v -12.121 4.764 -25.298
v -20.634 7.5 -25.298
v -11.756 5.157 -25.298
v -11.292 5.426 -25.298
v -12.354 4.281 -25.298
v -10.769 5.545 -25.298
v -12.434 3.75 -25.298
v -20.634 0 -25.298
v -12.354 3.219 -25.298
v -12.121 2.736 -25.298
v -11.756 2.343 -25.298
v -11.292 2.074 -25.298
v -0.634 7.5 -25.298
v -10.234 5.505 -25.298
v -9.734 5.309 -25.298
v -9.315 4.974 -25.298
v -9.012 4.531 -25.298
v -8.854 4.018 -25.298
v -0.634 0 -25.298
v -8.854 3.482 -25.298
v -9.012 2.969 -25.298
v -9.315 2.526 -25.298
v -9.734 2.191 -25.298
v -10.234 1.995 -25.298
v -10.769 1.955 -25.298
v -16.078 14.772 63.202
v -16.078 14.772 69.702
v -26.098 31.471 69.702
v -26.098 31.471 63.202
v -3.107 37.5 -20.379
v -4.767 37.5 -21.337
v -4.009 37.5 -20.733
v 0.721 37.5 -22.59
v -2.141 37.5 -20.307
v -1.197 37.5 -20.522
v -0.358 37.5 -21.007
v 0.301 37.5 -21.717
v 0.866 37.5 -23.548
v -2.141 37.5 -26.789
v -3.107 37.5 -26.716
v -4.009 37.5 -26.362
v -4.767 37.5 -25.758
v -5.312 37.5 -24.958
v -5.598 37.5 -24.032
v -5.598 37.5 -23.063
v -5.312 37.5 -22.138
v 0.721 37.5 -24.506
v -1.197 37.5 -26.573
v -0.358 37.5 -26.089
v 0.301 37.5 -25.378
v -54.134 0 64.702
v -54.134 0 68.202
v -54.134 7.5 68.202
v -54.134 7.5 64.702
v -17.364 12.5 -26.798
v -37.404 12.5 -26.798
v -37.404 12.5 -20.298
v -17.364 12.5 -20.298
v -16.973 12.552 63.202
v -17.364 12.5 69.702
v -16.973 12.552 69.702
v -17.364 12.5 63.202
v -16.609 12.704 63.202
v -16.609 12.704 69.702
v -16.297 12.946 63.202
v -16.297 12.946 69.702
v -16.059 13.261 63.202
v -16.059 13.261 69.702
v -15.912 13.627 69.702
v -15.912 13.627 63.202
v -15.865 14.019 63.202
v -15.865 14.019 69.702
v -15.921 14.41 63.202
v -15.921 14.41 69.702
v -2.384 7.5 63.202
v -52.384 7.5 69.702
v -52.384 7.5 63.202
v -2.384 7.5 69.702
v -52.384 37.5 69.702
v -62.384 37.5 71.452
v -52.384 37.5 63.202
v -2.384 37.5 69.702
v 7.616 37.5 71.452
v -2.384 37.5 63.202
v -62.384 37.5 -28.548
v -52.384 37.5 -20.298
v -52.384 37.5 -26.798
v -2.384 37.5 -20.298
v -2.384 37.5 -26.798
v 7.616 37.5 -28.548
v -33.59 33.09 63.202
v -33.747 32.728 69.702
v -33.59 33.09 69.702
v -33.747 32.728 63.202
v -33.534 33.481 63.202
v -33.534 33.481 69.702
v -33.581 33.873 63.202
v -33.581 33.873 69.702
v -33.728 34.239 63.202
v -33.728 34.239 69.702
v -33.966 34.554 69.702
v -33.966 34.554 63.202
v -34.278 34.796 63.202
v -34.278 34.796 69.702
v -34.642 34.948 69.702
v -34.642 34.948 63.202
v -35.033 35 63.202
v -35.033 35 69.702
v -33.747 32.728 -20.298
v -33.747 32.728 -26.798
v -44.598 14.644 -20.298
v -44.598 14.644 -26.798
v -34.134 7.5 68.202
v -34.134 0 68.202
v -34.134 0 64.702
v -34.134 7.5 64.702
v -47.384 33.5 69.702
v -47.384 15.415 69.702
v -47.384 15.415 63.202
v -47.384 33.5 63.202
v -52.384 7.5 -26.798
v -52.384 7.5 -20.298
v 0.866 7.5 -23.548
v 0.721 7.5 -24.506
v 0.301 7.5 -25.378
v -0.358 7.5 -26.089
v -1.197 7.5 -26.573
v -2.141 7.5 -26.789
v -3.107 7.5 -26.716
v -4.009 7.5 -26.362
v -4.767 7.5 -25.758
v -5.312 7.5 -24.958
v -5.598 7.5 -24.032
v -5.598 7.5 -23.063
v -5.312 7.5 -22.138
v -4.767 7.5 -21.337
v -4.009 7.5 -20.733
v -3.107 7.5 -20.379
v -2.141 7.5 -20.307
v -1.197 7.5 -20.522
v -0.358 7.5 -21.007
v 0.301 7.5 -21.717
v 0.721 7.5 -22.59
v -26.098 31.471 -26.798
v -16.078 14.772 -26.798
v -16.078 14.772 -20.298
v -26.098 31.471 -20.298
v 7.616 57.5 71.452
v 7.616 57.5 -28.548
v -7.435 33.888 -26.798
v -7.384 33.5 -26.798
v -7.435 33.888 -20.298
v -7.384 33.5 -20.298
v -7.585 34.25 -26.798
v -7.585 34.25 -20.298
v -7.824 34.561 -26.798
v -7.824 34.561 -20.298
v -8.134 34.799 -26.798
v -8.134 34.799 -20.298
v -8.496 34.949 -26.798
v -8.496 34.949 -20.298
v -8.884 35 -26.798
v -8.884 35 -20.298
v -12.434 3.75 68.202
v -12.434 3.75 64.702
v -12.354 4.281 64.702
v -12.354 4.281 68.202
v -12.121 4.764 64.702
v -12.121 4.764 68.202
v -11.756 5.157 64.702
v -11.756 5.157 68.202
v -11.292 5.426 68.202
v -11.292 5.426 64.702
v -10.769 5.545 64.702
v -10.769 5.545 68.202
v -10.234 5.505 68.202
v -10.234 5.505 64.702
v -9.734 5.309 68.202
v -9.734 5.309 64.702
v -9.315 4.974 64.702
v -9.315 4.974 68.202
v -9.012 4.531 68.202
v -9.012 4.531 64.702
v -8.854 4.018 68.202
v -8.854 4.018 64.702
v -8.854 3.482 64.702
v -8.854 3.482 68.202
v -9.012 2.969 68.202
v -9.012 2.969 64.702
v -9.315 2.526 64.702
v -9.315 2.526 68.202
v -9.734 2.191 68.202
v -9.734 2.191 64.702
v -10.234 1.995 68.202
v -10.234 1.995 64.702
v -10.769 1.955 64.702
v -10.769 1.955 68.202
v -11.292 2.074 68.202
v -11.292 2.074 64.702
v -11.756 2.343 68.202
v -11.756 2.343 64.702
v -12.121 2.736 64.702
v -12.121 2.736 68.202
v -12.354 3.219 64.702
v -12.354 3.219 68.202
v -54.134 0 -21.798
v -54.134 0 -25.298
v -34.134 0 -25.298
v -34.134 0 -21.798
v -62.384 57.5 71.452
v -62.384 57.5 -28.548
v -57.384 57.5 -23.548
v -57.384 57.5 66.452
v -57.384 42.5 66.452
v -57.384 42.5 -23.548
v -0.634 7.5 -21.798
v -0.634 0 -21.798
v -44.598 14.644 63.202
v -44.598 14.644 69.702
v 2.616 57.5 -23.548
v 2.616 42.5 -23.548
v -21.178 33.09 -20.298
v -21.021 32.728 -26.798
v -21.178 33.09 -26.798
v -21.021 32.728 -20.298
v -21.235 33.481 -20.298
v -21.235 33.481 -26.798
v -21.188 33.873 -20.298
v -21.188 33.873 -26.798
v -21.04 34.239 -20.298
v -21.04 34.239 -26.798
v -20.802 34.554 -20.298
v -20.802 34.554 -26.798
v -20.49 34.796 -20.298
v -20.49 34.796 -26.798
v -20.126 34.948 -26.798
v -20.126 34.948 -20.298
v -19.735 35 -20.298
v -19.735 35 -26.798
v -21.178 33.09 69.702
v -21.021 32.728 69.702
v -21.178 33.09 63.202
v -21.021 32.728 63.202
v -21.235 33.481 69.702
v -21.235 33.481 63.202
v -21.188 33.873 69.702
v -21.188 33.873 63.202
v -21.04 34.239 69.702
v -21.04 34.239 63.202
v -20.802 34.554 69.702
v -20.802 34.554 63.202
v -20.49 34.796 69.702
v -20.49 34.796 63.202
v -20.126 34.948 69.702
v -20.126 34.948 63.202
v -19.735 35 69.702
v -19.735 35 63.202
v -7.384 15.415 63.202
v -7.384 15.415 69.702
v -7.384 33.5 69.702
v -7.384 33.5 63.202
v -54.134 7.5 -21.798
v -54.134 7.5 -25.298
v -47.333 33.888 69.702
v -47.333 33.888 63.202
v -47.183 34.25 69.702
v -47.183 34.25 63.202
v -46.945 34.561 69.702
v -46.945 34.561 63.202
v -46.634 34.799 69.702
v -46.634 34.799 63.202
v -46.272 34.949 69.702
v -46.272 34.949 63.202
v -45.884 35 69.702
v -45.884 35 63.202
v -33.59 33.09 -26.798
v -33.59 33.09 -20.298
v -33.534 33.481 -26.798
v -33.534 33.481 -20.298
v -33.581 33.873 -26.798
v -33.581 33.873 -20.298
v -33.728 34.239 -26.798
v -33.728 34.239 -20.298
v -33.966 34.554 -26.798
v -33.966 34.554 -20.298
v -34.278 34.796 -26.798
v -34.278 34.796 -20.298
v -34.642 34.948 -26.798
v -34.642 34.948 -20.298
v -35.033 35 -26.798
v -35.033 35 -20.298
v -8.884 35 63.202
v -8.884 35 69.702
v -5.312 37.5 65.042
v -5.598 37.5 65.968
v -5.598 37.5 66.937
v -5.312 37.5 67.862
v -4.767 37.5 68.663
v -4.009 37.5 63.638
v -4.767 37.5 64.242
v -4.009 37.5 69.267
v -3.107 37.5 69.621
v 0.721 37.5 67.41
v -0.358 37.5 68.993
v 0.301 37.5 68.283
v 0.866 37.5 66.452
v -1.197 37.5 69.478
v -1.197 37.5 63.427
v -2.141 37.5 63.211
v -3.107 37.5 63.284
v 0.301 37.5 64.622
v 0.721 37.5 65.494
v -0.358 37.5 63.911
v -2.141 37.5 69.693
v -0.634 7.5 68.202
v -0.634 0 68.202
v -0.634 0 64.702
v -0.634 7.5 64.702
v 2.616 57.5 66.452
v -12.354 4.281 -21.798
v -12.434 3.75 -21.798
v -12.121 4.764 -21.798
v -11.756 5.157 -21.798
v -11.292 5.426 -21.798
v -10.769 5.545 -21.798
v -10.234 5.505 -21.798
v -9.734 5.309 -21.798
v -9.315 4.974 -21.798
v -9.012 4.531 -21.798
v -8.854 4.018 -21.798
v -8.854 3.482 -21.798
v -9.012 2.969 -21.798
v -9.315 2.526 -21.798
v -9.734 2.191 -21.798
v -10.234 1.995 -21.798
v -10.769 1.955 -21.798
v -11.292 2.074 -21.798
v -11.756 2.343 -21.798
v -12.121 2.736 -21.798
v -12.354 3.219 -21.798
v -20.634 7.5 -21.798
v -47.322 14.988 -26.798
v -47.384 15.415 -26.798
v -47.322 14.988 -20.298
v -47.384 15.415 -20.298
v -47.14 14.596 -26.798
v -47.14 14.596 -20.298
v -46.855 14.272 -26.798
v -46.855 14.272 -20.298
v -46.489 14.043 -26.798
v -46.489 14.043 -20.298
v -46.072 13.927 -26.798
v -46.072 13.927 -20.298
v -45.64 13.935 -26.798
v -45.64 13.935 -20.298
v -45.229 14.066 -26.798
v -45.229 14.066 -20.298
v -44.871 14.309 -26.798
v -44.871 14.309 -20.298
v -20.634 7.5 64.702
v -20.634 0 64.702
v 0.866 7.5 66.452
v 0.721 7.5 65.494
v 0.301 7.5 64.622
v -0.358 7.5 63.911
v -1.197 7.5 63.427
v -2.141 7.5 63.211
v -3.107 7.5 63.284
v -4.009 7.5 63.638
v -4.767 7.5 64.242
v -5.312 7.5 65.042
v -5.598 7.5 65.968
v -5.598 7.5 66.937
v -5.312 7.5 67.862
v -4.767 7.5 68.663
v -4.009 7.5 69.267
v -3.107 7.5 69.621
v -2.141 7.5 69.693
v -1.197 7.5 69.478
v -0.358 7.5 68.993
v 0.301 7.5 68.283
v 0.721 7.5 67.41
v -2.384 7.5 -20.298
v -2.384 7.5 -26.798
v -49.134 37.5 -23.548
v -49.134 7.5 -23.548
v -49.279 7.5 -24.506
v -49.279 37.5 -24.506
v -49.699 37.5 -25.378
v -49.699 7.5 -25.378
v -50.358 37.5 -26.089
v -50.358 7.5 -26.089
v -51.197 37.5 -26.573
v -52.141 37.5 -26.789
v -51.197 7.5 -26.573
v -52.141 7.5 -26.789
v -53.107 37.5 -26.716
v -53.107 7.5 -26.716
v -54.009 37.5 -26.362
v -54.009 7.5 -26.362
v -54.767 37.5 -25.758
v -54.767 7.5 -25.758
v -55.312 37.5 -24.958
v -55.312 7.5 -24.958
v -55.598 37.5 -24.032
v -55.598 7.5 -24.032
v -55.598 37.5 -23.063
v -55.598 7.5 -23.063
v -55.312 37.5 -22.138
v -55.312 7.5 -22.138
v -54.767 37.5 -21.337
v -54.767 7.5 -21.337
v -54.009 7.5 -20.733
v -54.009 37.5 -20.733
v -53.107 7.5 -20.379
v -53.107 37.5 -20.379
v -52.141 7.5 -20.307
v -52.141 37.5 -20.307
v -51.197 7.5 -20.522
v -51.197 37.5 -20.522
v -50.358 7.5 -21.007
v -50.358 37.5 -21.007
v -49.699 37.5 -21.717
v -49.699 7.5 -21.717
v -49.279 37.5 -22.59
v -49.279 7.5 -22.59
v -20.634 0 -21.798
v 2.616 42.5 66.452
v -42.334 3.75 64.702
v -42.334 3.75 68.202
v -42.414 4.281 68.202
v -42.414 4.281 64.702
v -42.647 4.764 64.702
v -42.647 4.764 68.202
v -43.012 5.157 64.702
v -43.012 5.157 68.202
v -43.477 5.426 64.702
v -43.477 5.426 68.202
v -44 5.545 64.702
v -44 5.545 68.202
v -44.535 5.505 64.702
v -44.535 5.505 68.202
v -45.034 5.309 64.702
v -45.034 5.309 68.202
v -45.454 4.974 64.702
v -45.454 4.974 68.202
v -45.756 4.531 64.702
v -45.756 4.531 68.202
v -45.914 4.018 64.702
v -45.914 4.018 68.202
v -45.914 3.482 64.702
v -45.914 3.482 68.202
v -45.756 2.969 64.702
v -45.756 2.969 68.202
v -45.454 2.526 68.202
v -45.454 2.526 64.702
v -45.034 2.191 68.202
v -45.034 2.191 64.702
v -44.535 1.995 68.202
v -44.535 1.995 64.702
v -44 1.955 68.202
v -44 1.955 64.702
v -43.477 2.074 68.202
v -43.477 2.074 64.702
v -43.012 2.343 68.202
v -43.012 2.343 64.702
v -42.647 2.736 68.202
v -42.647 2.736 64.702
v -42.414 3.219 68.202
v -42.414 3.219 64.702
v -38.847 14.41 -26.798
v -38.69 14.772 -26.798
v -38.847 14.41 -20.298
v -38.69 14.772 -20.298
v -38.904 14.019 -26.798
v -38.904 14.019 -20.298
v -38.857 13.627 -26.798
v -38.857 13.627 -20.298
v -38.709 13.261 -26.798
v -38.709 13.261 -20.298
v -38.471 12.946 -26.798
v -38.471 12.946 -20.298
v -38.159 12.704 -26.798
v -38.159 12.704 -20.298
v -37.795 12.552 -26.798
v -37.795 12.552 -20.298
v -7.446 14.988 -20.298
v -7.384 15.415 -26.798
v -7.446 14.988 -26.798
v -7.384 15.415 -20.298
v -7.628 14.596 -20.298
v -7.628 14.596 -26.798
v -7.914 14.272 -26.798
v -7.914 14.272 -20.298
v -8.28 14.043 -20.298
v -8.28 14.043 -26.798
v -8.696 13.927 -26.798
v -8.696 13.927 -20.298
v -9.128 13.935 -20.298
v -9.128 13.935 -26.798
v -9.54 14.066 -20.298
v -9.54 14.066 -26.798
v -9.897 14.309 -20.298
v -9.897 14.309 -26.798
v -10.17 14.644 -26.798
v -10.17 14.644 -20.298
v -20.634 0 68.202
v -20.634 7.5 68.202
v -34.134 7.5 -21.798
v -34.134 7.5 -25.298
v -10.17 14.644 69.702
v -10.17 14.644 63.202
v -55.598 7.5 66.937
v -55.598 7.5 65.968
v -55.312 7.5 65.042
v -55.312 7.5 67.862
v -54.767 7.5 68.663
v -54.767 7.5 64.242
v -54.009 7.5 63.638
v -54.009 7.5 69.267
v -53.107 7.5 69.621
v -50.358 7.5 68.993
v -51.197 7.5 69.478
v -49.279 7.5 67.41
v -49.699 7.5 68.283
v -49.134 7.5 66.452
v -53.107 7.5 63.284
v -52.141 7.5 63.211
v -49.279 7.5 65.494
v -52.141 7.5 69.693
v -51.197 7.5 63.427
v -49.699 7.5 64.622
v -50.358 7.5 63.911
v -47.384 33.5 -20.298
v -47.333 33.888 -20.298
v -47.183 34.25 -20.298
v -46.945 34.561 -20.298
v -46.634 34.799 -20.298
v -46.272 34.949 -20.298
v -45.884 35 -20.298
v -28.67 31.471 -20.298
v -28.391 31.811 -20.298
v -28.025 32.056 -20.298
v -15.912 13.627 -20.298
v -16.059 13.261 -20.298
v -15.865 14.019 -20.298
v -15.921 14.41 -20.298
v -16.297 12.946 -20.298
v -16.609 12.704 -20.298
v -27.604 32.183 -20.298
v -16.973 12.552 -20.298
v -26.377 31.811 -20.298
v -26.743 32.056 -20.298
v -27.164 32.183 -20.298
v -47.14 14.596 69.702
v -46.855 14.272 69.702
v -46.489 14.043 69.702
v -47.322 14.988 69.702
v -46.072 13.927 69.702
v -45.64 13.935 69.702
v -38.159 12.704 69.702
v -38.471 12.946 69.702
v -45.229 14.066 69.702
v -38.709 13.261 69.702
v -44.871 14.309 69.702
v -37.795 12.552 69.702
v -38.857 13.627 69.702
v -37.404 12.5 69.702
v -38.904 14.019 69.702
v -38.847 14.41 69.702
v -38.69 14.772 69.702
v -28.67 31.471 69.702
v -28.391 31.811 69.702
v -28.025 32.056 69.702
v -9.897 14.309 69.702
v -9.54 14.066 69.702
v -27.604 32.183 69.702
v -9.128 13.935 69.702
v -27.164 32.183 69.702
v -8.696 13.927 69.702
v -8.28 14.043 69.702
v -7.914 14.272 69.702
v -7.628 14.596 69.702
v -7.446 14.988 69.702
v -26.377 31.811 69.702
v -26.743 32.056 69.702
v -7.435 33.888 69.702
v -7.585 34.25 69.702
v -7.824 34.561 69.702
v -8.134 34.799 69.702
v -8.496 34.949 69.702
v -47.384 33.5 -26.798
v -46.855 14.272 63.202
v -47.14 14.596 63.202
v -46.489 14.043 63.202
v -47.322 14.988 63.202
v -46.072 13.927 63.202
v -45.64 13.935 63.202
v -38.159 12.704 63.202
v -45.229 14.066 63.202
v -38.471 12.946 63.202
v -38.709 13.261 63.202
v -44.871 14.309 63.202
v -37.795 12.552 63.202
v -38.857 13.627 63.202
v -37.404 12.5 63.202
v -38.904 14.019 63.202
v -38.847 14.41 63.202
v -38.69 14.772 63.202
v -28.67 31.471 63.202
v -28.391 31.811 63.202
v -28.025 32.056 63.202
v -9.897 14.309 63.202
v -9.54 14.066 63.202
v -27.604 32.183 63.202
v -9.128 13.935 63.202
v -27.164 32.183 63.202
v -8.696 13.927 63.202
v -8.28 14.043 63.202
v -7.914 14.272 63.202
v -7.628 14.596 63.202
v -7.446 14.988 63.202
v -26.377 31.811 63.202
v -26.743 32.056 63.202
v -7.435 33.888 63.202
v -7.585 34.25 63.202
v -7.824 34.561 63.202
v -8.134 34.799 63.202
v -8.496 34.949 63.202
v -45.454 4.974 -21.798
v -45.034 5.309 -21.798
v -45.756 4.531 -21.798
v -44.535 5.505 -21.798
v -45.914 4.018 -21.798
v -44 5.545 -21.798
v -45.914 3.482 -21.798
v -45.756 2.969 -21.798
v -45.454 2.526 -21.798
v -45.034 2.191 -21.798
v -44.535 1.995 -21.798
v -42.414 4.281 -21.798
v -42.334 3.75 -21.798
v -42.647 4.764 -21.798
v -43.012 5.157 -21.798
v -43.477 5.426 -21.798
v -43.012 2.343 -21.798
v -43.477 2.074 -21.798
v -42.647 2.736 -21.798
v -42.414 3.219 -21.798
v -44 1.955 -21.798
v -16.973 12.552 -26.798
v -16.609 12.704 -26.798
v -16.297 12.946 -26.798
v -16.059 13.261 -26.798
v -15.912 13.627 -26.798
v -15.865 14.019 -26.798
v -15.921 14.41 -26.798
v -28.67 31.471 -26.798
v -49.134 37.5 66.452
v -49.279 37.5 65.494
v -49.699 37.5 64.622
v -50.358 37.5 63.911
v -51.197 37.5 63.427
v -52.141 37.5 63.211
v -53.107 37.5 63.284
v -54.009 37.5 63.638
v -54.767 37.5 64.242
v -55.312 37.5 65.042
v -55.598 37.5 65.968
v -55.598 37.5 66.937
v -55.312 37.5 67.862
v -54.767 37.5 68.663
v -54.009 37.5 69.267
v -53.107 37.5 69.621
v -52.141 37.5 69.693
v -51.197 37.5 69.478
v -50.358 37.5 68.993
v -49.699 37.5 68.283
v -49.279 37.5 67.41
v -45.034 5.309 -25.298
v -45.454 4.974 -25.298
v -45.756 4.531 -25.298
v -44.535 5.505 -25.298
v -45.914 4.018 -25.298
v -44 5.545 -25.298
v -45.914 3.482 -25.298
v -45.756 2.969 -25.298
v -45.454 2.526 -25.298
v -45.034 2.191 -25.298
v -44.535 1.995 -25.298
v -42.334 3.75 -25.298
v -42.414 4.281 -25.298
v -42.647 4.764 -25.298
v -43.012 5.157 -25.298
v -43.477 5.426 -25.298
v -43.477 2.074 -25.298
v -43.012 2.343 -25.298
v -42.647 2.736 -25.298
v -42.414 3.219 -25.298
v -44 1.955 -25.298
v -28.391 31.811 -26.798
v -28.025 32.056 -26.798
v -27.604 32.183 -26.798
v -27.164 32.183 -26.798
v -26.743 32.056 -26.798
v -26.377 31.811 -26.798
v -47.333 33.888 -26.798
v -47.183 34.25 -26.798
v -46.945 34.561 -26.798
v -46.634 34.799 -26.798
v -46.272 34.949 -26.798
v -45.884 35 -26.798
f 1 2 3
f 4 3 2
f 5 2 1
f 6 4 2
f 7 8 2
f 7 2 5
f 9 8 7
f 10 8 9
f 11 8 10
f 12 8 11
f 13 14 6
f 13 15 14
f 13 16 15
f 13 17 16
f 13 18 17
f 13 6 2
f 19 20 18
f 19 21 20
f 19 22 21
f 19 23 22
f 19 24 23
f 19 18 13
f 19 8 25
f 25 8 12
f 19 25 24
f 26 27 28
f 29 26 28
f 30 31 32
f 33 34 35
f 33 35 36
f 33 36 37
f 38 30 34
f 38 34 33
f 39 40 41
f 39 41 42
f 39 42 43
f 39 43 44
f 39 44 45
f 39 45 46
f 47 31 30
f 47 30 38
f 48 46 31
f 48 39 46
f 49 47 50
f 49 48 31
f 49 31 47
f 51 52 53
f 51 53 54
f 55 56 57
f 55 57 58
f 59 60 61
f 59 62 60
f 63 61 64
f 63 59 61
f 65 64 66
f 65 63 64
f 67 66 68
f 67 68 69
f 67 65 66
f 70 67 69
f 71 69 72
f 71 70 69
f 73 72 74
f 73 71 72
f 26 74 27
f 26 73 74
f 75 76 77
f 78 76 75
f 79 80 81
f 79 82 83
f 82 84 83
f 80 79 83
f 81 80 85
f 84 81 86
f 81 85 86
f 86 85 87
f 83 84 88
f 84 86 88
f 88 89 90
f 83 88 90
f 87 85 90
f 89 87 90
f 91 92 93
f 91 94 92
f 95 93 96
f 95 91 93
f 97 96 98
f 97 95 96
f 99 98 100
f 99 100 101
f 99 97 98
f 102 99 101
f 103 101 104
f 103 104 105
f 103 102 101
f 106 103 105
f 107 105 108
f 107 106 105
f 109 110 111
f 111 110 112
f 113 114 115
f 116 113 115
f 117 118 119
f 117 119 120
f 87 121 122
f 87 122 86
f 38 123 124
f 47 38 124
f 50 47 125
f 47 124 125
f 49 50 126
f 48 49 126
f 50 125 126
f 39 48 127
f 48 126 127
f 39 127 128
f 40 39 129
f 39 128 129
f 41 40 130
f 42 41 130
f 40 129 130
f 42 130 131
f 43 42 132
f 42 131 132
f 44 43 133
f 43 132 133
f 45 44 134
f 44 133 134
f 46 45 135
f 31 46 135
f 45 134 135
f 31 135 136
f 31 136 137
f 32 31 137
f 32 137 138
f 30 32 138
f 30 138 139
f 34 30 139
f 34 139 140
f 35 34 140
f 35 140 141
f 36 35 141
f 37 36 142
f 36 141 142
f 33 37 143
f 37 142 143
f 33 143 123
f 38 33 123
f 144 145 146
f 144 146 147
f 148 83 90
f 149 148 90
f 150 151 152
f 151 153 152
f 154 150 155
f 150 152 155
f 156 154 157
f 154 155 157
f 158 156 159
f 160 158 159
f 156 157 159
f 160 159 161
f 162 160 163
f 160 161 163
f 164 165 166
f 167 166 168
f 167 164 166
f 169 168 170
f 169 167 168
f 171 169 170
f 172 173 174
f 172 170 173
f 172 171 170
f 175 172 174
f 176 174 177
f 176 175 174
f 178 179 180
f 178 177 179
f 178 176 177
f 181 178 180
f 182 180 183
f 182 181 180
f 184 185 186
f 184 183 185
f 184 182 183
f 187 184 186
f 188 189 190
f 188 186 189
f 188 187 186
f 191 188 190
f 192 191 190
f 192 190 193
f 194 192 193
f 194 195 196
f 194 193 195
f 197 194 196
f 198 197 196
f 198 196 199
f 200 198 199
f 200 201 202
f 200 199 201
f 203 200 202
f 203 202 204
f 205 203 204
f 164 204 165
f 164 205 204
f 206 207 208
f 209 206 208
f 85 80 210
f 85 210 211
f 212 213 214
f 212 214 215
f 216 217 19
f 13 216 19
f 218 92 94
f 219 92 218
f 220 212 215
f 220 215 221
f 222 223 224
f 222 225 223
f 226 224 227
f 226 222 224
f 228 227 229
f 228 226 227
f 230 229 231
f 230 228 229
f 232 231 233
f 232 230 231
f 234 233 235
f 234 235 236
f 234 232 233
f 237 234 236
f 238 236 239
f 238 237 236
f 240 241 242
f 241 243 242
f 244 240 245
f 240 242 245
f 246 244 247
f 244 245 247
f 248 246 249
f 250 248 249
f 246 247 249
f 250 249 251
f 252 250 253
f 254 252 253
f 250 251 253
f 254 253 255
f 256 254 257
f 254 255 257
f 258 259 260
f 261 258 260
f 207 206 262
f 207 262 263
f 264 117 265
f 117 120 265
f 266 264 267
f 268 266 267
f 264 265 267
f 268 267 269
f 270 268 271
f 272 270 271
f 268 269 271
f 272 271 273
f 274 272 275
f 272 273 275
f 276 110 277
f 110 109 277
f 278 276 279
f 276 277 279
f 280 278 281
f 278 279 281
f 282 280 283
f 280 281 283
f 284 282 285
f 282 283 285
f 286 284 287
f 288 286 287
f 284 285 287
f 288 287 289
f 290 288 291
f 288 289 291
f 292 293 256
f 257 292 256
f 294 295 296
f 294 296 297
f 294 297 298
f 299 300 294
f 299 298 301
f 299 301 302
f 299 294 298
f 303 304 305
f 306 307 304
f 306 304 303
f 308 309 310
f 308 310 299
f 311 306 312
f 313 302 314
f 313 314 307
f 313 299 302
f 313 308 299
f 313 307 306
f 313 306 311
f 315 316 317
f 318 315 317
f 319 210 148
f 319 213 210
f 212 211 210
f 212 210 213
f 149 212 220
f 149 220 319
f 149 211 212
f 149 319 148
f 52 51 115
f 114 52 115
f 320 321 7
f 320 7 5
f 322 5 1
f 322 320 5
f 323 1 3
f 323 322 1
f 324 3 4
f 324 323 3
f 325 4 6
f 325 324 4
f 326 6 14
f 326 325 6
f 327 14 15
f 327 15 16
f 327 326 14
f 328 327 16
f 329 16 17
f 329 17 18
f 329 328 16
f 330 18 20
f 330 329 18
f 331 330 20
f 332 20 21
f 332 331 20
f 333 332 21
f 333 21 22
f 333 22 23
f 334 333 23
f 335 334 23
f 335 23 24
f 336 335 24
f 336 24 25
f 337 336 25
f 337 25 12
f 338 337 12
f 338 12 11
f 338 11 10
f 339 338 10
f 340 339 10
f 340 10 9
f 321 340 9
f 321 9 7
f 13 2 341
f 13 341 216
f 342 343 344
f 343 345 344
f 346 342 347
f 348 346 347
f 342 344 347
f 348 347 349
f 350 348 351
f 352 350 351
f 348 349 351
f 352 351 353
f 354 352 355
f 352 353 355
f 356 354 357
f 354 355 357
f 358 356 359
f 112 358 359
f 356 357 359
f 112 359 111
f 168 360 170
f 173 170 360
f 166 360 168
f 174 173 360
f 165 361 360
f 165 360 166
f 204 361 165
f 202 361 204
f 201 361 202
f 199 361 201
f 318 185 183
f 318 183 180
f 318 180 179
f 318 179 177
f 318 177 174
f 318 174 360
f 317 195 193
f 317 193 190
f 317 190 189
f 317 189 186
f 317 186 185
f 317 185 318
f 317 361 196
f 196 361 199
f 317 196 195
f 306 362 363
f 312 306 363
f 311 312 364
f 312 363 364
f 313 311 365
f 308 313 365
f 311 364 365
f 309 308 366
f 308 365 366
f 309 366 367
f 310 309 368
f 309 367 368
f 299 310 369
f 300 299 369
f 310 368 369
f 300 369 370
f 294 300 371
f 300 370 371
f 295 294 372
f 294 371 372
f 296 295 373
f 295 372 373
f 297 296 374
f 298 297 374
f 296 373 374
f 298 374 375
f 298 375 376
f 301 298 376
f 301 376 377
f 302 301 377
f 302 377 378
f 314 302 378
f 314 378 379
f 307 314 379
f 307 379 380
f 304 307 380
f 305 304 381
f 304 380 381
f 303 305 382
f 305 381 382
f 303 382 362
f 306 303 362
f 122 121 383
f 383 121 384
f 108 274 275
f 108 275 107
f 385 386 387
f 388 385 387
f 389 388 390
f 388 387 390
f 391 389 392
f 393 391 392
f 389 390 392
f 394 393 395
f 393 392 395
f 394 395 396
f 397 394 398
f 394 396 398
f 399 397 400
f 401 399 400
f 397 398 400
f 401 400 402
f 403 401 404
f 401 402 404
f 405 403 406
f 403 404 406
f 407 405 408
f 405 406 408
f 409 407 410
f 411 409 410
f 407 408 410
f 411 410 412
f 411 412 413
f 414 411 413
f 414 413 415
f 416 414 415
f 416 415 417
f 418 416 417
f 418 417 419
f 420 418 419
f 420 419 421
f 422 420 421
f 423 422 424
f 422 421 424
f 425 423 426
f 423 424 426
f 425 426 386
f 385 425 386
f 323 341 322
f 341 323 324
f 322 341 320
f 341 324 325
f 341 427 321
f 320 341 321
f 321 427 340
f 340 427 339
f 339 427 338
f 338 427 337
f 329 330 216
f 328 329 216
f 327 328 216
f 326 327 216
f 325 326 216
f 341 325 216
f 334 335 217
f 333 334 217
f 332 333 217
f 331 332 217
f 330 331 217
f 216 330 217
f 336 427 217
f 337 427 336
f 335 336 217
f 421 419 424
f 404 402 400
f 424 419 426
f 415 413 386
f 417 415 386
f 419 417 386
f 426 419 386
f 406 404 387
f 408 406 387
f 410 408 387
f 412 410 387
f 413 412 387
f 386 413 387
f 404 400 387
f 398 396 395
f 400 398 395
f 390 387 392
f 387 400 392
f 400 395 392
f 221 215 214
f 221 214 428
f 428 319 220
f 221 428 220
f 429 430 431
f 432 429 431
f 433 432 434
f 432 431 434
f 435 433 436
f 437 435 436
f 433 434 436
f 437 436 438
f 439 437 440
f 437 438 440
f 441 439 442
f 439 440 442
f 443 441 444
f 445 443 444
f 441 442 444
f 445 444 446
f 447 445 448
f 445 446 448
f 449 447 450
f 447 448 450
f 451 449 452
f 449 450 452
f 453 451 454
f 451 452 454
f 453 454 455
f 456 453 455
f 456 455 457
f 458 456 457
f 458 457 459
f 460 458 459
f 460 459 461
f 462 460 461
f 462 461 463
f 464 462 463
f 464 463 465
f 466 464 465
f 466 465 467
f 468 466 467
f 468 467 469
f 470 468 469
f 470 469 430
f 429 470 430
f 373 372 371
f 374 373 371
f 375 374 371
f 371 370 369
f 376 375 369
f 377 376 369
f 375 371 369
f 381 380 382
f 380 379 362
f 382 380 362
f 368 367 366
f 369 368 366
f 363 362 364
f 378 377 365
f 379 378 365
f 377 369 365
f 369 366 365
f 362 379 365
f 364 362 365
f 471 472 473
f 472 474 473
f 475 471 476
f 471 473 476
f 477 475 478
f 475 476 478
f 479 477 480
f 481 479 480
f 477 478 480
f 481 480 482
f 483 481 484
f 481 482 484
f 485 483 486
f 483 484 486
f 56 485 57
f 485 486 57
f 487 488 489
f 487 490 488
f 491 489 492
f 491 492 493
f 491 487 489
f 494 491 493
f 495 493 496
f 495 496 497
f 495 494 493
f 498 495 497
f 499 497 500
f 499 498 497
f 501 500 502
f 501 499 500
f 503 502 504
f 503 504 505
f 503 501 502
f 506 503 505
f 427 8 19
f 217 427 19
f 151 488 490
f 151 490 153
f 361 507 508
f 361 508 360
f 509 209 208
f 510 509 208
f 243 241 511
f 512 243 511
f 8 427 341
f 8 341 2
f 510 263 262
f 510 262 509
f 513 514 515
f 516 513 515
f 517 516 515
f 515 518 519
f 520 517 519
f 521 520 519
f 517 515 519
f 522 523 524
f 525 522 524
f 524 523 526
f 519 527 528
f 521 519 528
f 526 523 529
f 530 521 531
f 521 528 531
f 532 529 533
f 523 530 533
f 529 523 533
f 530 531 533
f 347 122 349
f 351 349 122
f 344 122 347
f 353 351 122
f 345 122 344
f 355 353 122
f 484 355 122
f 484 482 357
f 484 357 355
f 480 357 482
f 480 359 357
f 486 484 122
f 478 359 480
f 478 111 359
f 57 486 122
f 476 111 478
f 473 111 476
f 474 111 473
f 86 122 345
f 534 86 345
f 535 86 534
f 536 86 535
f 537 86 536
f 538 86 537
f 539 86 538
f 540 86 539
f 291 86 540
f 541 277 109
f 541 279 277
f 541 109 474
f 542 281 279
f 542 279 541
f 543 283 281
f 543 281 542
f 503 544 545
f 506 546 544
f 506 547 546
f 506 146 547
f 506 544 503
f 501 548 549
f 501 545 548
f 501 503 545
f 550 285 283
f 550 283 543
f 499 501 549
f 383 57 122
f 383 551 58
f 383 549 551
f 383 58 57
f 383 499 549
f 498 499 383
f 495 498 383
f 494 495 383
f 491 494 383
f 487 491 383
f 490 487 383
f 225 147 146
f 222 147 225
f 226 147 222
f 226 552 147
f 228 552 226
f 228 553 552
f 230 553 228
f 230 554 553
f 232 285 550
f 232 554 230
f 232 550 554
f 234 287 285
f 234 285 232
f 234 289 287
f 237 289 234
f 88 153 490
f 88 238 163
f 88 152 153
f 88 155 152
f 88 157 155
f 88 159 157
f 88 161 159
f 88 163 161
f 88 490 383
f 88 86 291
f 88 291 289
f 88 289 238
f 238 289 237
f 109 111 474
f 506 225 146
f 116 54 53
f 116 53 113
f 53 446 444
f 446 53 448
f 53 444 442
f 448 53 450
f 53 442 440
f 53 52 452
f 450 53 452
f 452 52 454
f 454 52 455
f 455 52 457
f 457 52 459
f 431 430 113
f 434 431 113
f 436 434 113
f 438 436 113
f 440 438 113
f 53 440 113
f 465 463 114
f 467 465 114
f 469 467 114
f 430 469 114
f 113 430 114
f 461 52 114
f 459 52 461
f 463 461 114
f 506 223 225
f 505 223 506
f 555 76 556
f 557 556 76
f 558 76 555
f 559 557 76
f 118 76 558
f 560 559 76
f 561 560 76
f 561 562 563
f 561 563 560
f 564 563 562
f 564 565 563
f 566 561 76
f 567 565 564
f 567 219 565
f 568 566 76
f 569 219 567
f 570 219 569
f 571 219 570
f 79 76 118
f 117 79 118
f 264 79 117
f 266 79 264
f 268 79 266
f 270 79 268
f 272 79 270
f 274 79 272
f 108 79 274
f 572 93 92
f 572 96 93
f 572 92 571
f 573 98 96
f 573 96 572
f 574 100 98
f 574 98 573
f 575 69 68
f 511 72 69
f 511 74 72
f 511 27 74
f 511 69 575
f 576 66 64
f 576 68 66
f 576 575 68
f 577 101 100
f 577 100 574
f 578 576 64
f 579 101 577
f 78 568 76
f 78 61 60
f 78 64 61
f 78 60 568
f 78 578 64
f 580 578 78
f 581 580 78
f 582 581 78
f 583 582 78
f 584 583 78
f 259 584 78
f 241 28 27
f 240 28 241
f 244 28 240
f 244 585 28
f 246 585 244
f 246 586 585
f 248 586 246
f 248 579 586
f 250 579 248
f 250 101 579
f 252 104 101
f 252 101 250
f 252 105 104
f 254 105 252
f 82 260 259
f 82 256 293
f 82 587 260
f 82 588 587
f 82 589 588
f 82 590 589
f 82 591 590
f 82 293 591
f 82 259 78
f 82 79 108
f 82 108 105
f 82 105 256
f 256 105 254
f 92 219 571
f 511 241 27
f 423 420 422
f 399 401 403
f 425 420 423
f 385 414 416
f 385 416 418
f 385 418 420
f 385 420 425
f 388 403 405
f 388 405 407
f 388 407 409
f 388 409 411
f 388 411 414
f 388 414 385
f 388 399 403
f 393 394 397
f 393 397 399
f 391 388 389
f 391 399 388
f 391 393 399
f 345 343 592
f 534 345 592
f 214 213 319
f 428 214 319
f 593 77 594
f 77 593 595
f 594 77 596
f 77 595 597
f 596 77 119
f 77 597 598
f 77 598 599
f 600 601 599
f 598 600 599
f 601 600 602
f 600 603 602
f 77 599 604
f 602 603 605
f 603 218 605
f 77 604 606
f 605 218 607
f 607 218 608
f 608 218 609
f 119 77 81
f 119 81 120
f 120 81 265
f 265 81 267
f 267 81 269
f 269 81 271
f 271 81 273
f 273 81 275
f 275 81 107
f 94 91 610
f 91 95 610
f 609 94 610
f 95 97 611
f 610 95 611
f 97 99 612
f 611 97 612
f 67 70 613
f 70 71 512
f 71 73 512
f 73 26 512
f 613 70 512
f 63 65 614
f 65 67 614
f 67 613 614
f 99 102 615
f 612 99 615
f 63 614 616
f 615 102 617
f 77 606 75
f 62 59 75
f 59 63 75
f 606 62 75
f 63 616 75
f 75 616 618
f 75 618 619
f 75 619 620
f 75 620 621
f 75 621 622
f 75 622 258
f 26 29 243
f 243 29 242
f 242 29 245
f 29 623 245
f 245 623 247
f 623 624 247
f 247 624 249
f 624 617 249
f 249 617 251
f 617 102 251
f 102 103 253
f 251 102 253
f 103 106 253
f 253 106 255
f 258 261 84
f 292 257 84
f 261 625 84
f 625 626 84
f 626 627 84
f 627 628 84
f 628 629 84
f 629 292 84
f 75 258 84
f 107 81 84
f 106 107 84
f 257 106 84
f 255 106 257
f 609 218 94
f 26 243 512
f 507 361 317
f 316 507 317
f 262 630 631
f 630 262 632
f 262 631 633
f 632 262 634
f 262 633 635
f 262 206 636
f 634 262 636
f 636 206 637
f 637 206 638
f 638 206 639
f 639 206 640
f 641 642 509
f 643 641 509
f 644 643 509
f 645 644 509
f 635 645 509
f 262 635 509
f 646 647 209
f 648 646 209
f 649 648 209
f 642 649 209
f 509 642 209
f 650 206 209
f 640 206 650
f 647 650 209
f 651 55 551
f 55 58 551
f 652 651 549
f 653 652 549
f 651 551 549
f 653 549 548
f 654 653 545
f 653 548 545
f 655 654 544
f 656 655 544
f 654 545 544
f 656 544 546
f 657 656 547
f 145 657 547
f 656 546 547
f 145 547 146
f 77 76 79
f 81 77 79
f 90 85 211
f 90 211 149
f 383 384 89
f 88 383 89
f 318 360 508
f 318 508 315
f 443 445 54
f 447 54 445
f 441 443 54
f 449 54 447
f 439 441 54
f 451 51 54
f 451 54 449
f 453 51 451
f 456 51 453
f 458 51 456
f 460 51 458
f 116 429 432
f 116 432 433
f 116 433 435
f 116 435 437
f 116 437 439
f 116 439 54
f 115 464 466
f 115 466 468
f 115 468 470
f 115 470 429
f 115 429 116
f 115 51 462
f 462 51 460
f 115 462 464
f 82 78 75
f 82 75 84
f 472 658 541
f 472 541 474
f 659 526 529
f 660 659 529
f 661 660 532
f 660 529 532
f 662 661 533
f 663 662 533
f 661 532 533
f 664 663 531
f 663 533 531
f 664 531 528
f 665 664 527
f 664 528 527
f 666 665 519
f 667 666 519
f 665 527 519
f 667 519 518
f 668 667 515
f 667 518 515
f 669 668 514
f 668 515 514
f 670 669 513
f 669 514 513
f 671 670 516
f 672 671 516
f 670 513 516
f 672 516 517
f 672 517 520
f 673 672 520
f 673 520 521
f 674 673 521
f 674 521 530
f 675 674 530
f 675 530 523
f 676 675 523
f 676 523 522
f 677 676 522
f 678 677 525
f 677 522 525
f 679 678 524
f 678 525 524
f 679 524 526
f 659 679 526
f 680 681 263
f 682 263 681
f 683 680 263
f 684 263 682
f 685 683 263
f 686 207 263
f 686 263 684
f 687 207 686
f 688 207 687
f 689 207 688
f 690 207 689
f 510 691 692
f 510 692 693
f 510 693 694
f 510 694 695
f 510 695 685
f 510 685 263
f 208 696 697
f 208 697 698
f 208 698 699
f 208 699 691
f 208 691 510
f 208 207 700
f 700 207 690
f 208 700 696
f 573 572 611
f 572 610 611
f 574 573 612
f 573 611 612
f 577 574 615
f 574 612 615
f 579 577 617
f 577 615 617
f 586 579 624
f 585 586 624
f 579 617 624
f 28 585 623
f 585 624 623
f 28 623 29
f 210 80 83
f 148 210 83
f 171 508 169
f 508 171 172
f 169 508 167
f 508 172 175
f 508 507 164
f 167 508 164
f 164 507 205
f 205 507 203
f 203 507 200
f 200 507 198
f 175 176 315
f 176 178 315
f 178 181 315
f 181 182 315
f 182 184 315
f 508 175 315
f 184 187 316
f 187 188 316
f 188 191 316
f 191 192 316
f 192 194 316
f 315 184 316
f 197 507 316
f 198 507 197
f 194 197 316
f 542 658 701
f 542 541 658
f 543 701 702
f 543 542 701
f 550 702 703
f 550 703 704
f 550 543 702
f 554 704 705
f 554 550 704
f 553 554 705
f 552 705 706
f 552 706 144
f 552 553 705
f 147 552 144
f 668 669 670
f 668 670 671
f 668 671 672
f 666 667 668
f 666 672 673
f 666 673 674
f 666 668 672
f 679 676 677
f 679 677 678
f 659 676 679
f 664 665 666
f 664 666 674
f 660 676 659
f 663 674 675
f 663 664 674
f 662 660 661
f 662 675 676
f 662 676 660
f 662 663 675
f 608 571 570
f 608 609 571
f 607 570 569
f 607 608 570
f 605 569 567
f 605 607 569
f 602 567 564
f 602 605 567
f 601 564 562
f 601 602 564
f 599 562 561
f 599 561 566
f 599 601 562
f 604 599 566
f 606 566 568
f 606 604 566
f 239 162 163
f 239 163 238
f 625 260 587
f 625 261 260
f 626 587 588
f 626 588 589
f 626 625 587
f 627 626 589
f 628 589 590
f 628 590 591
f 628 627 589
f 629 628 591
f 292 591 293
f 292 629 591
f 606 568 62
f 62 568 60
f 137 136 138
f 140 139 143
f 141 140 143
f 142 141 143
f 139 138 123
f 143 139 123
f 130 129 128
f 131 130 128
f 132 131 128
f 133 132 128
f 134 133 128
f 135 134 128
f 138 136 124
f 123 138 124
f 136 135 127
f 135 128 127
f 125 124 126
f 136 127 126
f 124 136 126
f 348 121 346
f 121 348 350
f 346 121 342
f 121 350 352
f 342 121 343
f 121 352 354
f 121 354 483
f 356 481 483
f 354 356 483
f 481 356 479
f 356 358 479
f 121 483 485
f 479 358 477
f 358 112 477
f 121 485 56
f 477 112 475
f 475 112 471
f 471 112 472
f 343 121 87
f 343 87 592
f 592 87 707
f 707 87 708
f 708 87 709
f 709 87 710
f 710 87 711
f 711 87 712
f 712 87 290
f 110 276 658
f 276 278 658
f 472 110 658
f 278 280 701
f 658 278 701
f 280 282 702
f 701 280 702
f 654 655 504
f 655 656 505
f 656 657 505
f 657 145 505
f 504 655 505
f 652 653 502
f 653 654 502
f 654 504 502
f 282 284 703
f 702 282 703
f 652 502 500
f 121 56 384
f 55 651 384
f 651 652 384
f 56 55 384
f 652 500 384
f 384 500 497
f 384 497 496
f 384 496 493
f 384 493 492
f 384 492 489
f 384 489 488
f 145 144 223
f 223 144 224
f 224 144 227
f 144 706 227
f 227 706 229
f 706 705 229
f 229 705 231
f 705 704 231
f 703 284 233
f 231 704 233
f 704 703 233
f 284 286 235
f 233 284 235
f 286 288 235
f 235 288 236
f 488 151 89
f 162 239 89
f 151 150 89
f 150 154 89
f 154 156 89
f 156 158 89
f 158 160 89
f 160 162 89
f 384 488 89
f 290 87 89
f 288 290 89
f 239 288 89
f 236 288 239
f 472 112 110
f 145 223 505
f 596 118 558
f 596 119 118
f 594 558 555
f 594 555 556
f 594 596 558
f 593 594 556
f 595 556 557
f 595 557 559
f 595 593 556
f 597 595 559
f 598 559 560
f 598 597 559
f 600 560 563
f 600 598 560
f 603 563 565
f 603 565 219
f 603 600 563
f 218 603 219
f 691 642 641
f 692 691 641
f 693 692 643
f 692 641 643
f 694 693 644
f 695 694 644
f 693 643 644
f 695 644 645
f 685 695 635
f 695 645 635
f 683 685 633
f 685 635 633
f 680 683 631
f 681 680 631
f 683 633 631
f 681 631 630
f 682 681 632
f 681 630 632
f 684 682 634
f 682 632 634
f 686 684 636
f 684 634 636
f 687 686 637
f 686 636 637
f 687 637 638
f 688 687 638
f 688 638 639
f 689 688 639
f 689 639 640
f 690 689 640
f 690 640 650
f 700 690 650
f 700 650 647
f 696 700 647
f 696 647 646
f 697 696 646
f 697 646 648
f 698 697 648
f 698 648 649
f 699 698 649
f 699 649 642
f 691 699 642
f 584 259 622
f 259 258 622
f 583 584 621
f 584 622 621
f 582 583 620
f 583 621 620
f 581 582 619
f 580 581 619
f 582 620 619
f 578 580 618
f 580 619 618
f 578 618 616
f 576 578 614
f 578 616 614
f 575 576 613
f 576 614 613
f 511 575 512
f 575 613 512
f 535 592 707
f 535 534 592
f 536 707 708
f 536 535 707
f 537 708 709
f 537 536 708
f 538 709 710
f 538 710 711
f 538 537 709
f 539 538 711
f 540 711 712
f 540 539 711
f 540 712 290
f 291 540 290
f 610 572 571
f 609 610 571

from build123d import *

# Parameters (mm, degrees)
SKETCH1_W             = 20
SKETCH1_H             = 3.5
BOSS_EXTRUDE1_DEPTH   = 7.5
BOSS_EXTRUDE1_2_DEPTH = 7.5
BOSS_EXTRUDE1_3_DEPTH = 7.5
BOSS_EXTRUDE1_4_DEPTH = 7.5
SKETCH2_R             = 3.25
BOSS_EXTRUDE2_DEPTH   = 30
BOSS_EXTRUDE2_2_DEPTH = 30
BOSS_EXTRUDE2_3_DEPTH = 30
BOSS_EXTRUDE2_4_DEPTH = 30
SKETCH3_W             = 70
SKETCH3_H             = 100
BOSS_EXTRUDE3_DEPTH   = 20
SKETCH4_W             = 60
SKETCH4_H             = 90
CUT_EXTRUDE1_DEPTH    = 15
SKETCH5_W             = 50
SKETCH5_H             = 30
BOSS_EXTRUDE4_DEPTH   = 6.5
FILLET2_R             = 1.5
SKETCH7_R             = 1.8
CUT_EXTRUDE2_DEPTH    = 93.5


with BuildPart() as part:
    # Sketch1 → Boss-Extrude1 (new body)
    with BuildSketch(Plane(origin=(0, 0, 0), x_dir=(1, 0, 0), z_dir=(0, 1, 0))):
        with Locations((-44.134164605, 23.547689378)):
            Rectangle(SKETCH1_W, SKETCH1_H)
    extrude(amount=BOSS_EXTRUDE1_DEPTH)


with BuildPart() as body_2:
    # Sketch1 → Boss-Extrude1 2 (new body)
    with BuildSketch(Plane(origin=(0, 0, 0), x_dir=(1, 0, 0), z_dir=(0, 1, 0))):
        with Locations((-10.634164605, 23.547689378)):
            Rectangle(SKETCH1_W, SKETCH1_H)
    extrude(amount=BOSS_EXTRUDE1_2_DEPTH)


with BuildPart() as body_3:
    # Sketch1 → Boss-Extrude1 3 (new body)
    with BuildSketch(Plane(origin=(0, 0, 0), x_dir=(1, 0, 0), z_dir=(0, 1, 0))):
        with Locations((-44.134164605, -66.452310622)):
            Rectangle(SKETCH1_W, SKETCH1_H)
    extrude(amount=BOSS_EXTRUDE1_3_DEPTH)


with BuildPart() as body_4:
    # Sketch1 → Boss-Extrude1 4 (new body)
    with BuildSketch(Plane(origin=(0, 0, 0), x_dir=(1, 0, 0), z_dir=(0, 1, 0))):
        with Locations((-10.634164605, -66.452310622)):
            Rectangle(SKETCH1_W, SKETCH1_H)
    extrude(amount=BOSS_EXTRUDE1_4_DEPTH)


with BuildPart() as body_5:
    # Sketch2 → Boss-Extrude2 (new body)
    with BuildSketch(Plane(origin=(0, 7.5, 0), x_dir=(1, 0, 0), z_dir=(0, 1, 0))):
        with Locations((-2.384164605, -66.452310622)):
            Circle(SKETCH2_R)
    extrude(amount=BOSS_EXTRUDE2_DEPTH)


with BuildPart() as body_6:
    # Sketch2 → Boss-Extrude2 2 (new body)
    with BuildSketch(Plane(origin=(0, 7.5, 0), x_dir=(1, 0, 0), z_dir=(0, 1, 0))):
        with Locations((-52.384164605, 23.547689378)):
            Circle(SKETCH2_R)
    extrude(amount=BOSS_EXTRUDE2_2_DEPTH)


with BuildPart() as body_7:
    # Sketch2 → Boss-Extrude2 3 (new body)
    with BuildSketch(Plane(origin=(0, 7.5, 0), x_dir=(1, 0, 0), z_dir=(0, 1, 0))):
        with Locations((-2.384164605, 23.547689378)):
            Circle(SKETCH2_R)
    extrude(amount=BOSS_EXTRUDE2_3_DEPTH)


with BuildPart() as body_8:
    # Sketch2 → Boss-Extrude2 4 (new body)
    with BuildSketch(Plane(origin=(0, 7.5, 0), x_dir=(1, 0, 0), z_dir=(0, 1, 0))):
        with Locations((-52.384164605, -66.452310622)):
            Circle(SKETCH2_R)
    extrude(amount=BOSS_EXTRUDE2_4_DEPTH)


with BuildPart() as body_9:
    # Sketch3 → Boss-Extrude3 (new body)
    with BuildSketch(Plane(origin=(0, 37.5, 0), x_dir=(1, 0, 0), z_dir=(0, 1, 0))):
        with Locations((-27.384164605, -21.452310622)):
            Rectangle(SKETCH3_W, SKETCH3_H)
    extrude(amount=BOSS_EXTRUDE3_DEPTH)

    # Sketch4 → Cut-Extrude1 (cut)
    with BuildSketch(Plane(origin=(0, 57.5, 0), x_dir=(1, 0, 0), z_dir=(0, 1, 0))):
        with Locations((-27.384164605, -21.452310622)):
            Rectangle(SKETCH4_W, SKETCH4_H)
    extrude(amount=-CUT_EXTRUDE1_DEPTH, mode=Mode.SUBTRACT)

    # Sketch5 → Boss-Extrude4 (add)
    with BuildSketch(Plane.XY.offset(69.702310622)):
        with Locations((-27.384164605, 22.5)):
            Rectangle(SKETCH5_W, SKETCH5_H)
        Polygon((-47.384164605, 35), (-32.384164605, 35), (-47.384164605, 10), align=None, mode=Mode.SUBTRACT)
        Polygon((-7.384164605, 10), (-7.384164605, 35), (-22.384164605, 35), align=None, mode=Mode.SUBTRACT)
        Polygon((-27.384164605, 33.615080175), (-40.05321271, 12.5), (-14.7151165, 12.5), align=None, mode=Mode.SUBTRACT)
    boss_extrude4 = extrude(amount=-BOSS_EXTRUDE4_DEPTH)

    # Mirror1: Boss-Extrude4 across plane
    add(boss_extrude4.mirror(Plane(origin=(0, 0, 21.452310622), x_dir=(1, 0, 0), z_dir=(0, 0, -1))))

    # Fillet2
    fillet2_edges = [body_9.edges().sort_by_distance(p)[0] for p in [
        (-47.384164605, 35, 66.452310622),
        (-32.384164605, 35, 66.452310622),
        (-47.384164605, 10, 66.452310622),
        (-22.384164605, 35, 66.452310622),
        (-7.384164605, 35, 66.452310622),
        (-7.384164605, 10, 66.452310622),
        (-14.7151165, 12.5, 66.452310622),
        (-40.05321271, 12.5, 66.452310622),
        (-27.384164605, 33.615080175, 66.452310622),
        (-47.384164605, 10, -23.547689378),
        (-32.384164605, 35, -23.547689378),
        (-47.384164605, 35, -23.547689378),
        (-7.384164605, 10, -23.547689378),
        (-7.384164605, 35, -23.547689378),
        (-22.384164605, 35, -23.547689378),
        (-27.384164605, 33.615080175, -23.547689378),
        (-40.05321271, 12.5, -23.547689378),
        (-14.7151165, 12.5, -23.547689378),
    ]]
    fillet(fillet2_edges, radius=FILLET2_R)


with BuildPart() as cut_extrude2_tool:
    # Sketch7 → Cut-Extrude2 (new body)
    with BuildSketch(Plane.XY.offset(68.202310622)):
        with Locations((-44.134164605, 3.75)):
            Circle(SKETCH7_R)
    cut_extrude2 = extrude(amount=-CUT_EXTRUDE2_DEPTH)


with BuildPart() as part_1:
    add(part.part)

    # Cut-Extrude2: cut by cut_extrude2_tool
    add(cut_extrude2_tool.part, mode=Mode.SUBTRACT)


with BuildPart() as body_3_1:
    add(body_3.part)

    # Cut-Extrude2: cut by cut_extrude2_tool
    add(cut_extrude2_tool.part, mode=Mode.SUBTRACT)


with BuildPart() as mirror2_tool:
    # Mirror2: Cut-Extrude2 across plane
    add(cut_extrude2.mirror(Plane.ZY.offset(27.384164605)))


with BuildPart() as body_2_1:
    add(body_2.part)

    # Mirror2: cut by mirror2_tool
    add(mirror2_tool.part, mode=Mode.SUBTRACT)


with BuildPart() as body_4_1:
    add(body_4.part)

    # Mirror2: cut by mirror2_tool
    add(mirror2_tool.part, mode=Mode.SUBTRACT)


solid = Compound([body_5.part, body_6.part, body_7.part, body_8.part, body_9.part, part_1.part, body_3_1.part, body_2_1.part, body_4_1.part])
